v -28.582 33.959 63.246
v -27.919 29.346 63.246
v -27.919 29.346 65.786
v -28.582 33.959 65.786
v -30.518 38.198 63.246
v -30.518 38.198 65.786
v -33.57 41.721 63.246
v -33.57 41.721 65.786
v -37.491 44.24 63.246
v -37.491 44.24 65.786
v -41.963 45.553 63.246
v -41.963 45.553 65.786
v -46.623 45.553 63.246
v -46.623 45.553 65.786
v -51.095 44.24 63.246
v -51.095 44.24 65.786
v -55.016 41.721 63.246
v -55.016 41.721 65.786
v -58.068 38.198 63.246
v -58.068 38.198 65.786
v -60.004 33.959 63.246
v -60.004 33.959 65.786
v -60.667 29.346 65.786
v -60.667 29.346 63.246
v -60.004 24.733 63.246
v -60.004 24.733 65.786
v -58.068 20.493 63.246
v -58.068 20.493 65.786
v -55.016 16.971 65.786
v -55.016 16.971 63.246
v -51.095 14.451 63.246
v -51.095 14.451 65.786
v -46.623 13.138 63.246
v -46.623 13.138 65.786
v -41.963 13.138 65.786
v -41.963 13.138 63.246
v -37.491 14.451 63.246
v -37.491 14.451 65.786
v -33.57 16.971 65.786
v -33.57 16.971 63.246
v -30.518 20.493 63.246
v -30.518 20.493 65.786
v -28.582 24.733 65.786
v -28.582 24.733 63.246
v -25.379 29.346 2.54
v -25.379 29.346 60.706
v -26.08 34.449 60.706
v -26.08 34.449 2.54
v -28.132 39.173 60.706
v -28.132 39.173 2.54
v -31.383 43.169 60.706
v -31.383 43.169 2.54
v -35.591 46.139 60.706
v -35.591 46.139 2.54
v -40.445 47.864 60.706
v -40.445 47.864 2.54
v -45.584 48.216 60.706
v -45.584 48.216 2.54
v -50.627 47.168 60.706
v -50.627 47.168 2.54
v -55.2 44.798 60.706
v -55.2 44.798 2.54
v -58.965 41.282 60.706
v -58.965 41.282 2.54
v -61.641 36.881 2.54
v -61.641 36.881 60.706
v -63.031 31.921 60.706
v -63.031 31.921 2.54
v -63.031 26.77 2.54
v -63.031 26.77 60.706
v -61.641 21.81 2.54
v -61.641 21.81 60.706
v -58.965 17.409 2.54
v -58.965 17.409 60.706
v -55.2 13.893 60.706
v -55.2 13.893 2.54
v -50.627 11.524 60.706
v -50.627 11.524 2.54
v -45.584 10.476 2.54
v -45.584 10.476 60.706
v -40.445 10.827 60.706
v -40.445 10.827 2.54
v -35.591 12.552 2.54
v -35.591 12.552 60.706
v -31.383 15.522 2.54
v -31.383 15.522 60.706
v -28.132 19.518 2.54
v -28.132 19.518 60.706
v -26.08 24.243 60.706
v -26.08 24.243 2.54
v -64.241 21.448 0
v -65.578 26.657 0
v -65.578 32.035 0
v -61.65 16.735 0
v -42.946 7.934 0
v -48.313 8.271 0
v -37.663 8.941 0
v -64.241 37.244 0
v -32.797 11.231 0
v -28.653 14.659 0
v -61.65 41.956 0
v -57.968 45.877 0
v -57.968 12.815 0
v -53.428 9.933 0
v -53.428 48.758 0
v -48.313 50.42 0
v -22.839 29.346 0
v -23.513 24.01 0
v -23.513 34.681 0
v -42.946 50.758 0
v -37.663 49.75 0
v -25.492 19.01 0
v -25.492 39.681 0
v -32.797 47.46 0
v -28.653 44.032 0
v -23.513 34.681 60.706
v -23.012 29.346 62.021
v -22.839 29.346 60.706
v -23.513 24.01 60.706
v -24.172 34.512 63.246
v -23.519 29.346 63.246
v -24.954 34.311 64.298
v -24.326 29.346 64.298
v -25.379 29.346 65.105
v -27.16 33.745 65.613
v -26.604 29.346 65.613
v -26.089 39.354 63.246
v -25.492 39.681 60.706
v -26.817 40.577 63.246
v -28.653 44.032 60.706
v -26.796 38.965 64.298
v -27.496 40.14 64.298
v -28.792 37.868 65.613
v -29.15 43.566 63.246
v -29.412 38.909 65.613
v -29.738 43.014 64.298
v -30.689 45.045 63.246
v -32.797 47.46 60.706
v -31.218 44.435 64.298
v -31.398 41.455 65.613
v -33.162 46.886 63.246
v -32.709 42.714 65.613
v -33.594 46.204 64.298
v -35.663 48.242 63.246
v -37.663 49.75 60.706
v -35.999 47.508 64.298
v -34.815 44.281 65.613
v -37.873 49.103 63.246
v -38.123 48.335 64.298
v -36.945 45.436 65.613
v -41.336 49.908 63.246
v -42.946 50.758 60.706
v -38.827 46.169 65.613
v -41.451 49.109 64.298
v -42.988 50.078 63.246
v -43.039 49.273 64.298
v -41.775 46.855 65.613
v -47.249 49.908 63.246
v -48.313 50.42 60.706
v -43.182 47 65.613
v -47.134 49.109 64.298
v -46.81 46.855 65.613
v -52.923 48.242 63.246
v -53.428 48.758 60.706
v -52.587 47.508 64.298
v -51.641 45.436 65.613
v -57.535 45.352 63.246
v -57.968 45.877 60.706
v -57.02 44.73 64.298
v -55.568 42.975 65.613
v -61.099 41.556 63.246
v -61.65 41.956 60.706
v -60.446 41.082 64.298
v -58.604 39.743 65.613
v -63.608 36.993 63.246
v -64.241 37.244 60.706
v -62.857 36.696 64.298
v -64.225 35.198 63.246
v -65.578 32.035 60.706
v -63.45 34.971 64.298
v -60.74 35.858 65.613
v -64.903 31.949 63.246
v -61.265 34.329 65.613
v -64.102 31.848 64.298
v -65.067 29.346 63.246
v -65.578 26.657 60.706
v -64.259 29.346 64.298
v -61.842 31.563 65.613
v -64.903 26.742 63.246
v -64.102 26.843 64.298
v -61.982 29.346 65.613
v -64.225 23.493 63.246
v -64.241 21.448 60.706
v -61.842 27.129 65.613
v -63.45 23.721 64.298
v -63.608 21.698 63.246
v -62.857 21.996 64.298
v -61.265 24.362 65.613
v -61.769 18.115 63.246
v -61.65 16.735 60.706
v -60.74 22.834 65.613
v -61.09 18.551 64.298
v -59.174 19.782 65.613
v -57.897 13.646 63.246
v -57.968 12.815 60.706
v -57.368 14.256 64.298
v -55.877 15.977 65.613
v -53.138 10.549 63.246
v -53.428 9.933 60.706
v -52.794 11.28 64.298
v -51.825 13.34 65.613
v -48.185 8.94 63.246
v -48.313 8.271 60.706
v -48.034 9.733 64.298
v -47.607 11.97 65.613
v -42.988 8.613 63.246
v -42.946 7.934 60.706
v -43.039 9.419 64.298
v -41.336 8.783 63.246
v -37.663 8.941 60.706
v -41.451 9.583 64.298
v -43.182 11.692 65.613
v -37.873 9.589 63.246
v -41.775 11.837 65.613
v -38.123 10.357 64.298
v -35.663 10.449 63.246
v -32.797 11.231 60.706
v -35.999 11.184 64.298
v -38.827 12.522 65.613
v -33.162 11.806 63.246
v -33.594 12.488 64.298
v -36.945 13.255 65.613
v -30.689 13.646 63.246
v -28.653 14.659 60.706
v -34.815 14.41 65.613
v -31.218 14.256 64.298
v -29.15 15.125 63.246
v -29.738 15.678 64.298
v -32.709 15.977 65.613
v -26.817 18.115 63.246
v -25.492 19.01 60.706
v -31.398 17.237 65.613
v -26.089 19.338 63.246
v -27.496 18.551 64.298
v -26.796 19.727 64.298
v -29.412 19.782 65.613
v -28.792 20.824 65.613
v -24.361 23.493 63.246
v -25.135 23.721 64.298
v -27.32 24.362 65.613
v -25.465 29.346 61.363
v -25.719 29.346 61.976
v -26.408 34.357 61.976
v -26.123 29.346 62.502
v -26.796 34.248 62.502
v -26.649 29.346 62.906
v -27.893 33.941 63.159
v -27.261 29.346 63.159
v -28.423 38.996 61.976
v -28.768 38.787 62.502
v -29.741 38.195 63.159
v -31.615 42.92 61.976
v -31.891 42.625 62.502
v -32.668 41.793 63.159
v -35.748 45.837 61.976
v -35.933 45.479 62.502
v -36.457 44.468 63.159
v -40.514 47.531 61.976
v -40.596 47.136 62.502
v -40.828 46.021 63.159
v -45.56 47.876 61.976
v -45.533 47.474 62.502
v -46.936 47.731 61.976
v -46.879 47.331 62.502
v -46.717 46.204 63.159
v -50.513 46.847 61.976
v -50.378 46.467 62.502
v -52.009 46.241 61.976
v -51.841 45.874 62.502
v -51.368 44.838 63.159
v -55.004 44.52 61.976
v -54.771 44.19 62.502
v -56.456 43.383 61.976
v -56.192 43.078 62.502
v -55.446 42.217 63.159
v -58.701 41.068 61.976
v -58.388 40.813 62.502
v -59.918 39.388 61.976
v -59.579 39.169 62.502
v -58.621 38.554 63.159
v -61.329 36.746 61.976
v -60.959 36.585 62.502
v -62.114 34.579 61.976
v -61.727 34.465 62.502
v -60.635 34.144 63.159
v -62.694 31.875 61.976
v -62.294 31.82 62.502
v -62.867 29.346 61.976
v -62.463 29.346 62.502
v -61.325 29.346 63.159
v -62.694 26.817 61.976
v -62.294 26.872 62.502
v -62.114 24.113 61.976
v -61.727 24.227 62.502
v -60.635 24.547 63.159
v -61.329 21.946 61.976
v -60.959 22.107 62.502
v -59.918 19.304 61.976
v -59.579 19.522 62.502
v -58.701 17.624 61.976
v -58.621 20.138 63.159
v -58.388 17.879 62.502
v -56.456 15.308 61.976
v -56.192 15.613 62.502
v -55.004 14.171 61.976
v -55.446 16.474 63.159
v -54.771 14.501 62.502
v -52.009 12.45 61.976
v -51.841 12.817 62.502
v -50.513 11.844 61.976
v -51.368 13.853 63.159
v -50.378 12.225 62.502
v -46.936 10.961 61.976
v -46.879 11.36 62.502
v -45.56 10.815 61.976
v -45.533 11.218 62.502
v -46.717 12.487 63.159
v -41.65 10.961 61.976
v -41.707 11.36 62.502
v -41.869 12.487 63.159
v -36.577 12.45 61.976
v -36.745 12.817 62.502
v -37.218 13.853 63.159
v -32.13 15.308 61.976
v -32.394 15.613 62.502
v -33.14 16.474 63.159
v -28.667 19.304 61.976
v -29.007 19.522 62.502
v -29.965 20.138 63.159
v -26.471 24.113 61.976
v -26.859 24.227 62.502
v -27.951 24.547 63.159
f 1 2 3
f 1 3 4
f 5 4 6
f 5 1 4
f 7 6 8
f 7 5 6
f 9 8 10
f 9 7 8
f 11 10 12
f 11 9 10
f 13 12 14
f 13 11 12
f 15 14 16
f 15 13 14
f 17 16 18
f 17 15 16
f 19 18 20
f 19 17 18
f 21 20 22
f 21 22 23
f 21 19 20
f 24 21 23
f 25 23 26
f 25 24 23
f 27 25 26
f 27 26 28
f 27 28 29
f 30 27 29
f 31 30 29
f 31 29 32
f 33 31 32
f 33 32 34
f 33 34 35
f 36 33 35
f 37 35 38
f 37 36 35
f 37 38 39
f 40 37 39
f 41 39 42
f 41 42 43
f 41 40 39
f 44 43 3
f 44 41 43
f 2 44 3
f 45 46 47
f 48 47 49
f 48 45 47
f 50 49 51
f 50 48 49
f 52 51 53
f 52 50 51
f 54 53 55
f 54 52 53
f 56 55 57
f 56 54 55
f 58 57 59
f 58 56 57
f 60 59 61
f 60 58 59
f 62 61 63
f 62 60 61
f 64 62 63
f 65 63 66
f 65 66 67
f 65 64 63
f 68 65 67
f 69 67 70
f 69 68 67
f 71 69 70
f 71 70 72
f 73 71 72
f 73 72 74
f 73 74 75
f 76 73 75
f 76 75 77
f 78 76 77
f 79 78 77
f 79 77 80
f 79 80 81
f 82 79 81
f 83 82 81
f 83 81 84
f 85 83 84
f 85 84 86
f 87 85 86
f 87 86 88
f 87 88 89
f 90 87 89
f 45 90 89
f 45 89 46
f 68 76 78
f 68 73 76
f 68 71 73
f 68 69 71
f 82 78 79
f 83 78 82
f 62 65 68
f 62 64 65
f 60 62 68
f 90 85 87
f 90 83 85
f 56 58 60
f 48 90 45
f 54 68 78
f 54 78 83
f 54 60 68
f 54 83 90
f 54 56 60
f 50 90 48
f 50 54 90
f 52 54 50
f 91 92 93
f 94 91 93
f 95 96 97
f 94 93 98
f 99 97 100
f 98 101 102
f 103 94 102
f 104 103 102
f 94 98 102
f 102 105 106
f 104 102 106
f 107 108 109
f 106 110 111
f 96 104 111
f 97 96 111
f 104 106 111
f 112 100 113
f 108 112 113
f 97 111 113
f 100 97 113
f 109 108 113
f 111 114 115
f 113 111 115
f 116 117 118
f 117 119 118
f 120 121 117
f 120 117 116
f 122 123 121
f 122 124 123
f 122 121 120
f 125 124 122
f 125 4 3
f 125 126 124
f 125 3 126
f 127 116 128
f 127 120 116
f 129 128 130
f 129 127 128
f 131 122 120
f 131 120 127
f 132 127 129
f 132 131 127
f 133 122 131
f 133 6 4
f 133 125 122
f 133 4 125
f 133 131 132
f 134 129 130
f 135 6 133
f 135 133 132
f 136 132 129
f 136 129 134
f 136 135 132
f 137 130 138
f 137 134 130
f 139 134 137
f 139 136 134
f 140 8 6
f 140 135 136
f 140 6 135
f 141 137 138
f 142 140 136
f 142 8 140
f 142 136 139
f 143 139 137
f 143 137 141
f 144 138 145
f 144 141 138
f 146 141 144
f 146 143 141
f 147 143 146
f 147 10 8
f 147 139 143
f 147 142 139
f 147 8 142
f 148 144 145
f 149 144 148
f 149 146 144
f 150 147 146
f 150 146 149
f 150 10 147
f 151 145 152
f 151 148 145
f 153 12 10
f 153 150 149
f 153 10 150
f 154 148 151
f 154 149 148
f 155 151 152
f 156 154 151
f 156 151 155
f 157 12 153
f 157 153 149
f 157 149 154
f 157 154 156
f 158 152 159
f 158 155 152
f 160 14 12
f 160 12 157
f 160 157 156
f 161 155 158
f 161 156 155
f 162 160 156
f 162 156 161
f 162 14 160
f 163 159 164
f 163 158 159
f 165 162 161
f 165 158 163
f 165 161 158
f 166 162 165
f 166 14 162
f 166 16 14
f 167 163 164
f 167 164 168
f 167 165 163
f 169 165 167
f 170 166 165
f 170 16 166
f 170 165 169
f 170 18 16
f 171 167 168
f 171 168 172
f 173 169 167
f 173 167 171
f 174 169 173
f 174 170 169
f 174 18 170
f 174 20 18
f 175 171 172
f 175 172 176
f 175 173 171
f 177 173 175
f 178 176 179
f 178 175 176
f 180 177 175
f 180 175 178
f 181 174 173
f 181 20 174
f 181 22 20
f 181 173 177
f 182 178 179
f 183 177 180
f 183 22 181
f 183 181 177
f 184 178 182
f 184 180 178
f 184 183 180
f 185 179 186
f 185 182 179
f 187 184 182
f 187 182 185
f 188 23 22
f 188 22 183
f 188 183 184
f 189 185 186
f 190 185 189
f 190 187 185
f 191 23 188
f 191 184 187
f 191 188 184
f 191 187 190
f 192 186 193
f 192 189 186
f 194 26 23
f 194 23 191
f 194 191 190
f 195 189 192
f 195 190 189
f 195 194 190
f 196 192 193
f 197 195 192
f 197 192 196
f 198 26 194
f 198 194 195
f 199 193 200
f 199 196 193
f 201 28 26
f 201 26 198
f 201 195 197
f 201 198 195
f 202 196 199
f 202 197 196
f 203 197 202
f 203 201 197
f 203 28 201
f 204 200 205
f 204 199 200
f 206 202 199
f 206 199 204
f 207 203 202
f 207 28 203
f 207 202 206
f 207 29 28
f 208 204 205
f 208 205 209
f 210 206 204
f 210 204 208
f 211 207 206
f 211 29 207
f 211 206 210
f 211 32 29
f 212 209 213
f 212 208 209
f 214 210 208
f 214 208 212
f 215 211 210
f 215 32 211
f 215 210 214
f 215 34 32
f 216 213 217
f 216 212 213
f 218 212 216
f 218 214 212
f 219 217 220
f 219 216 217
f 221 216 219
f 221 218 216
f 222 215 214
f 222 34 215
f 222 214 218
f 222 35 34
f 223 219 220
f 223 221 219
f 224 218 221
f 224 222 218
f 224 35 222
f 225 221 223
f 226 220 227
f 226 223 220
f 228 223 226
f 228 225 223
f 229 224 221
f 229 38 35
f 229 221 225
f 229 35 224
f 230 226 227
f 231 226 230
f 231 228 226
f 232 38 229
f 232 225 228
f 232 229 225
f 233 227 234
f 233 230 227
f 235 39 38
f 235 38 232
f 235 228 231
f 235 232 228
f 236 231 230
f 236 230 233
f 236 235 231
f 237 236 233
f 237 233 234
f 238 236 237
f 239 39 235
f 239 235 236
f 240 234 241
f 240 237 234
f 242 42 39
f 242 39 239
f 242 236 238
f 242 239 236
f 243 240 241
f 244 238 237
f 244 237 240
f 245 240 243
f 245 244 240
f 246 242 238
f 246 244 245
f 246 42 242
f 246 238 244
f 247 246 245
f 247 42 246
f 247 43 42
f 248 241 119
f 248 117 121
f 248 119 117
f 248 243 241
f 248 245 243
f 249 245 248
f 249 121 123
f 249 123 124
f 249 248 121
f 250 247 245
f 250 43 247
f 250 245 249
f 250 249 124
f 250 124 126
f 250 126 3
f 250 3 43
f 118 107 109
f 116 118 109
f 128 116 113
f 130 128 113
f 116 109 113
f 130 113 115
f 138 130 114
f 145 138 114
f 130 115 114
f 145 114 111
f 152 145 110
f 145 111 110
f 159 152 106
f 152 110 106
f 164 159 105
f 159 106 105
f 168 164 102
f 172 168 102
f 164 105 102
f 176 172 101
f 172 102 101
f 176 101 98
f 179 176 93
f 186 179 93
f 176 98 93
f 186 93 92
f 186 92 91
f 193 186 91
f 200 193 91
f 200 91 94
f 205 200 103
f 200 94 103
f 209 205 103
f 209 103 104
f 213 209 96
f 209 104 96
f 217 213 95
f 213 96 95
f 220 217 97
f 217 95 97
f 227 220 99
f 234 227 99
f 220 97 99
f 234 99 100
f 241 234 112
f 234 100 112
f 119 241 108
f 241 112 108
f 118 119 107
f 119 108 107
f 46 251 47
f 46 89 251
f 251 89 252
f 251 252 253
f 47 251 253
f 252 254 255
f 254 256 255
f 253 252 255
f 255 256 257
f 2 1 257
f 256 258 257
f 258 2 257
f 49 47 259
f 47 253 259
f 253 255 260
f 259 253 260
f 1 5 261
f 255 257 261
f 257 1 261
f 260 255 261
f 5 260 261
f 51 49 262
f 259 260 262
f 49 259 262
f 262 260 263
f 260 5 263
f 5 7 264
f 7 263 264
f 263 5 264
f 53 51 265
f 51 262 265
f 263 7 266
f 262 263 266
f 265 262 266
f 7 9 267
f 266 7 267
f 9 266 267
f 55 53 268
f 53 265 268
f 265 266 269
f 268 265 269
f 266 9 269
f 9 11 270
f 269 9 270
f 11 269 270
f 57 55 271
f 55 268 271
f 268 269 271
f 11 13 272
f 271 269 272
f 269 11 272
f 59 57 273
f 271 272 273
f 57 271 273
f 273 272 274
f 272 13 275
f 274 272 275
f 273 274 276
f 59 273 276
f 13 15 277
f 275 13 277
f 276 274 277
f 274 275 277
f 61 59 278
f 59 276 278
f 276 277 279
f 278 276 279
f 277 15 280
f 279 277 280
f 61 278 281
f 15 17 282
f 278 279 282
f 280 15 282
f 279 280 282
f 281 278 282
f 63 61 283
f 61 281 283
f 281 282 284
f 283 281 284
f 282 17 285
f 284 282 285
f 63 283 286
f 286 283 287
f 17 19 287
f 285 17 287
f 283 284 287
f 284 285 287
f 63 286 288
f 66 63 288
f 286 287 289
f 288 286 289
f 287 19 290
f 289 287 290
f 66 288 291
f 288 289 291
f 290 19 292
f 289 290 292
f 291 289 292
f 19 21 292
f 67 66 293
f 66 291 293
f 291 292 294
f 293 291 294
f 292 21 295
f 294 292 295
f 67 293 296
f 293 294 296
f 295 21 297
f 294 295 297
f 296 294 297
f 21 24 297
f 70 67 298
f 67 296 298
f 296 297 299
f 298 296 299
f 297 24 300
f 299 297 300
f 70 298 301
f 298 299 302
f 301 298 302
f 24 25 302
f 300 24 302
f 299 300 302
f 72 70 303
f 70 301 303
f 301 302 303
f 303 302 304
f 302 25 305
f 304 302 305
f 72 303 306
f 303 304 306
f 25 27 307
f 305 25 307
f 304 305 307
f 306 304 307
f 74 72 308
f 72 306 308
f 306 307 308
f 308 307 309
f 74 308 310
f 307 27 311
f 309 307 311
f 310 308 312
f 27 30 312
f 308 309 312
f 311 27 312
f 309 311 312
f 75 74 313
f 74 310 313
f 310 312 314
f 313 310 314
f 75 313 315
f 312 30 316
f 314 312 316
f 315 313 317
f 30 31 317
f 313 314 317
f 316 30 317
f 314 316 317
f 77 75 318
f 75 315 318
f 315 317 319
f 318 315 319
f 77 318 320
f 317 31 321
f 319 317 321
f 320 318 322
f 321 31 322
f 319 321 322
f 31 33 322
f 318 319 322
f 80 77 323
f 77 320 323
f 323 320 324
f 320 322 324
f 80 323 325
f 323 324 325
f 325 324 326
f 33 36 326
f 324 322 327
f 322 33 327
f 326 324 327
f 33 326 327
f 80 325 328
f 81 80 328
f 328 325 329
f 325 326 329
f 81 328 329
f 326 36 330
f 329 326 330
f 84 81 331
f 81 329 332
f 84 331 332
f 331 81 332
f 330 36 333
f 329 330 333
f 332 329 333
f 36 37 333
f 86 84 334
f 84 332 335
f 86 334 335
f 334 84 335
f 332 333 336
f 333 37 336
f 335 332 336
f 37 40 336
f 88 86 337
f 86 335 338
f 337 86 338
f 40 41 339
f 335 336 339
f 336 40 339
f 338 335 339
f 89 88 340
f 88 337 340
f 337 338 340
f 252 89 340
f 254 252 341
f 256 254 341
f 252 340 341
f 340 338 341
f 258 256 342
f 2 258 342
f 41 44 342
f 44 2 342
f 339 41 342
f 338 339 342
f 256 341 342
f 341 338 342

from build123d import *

# Parameters (mm, degrees)
F0_R     = 21.4542850261
F1_DEPTH = 65.786
F2_R     = 5.08
F3_T     = -2.54


# Not quite as in the source:
# - a shell that OpenCascade refuses in one call is made with other operations: the cavity is built on its own and cut out


with BuildPart() as f1:
    # F0 (on Top) → F1 (new body)
    with BuildSketch(Plane.XY):
        with Locations((-44.2928858101, 29.3457191437)):
            Circle(F0_R)
    extrude(amount=F1_DEPTH)

    # F2
    f2_edges = [f1.edges().sort_by_distance(p)[0] for p in [
        (-65.747171, 29.345719, 65.786),
    ]]
    fillet(f2_edges, radius=F2_R)

    # F3: a shell. OpenCascade refuses it in one call, so the cavity is built on its own and cut out:
    # the body offset inwards by the wall thickness, plus a prism from it out through each open face.
    f3_core = offset(f1.part, amount=F3_T, mode=Mode.PRIVATE)
    f3_exits = [f3_core.faces().sort_by_distance(p)[0] for p in [
        (-44.292886, 29.345719, 63.246),
    ]]
    add(f3_core, mode=Mode.SUBTRACT)
    extrude(f3_exits, amount=-F3_T, mode=Mode.SUBTRACT)


solid = f1.part
